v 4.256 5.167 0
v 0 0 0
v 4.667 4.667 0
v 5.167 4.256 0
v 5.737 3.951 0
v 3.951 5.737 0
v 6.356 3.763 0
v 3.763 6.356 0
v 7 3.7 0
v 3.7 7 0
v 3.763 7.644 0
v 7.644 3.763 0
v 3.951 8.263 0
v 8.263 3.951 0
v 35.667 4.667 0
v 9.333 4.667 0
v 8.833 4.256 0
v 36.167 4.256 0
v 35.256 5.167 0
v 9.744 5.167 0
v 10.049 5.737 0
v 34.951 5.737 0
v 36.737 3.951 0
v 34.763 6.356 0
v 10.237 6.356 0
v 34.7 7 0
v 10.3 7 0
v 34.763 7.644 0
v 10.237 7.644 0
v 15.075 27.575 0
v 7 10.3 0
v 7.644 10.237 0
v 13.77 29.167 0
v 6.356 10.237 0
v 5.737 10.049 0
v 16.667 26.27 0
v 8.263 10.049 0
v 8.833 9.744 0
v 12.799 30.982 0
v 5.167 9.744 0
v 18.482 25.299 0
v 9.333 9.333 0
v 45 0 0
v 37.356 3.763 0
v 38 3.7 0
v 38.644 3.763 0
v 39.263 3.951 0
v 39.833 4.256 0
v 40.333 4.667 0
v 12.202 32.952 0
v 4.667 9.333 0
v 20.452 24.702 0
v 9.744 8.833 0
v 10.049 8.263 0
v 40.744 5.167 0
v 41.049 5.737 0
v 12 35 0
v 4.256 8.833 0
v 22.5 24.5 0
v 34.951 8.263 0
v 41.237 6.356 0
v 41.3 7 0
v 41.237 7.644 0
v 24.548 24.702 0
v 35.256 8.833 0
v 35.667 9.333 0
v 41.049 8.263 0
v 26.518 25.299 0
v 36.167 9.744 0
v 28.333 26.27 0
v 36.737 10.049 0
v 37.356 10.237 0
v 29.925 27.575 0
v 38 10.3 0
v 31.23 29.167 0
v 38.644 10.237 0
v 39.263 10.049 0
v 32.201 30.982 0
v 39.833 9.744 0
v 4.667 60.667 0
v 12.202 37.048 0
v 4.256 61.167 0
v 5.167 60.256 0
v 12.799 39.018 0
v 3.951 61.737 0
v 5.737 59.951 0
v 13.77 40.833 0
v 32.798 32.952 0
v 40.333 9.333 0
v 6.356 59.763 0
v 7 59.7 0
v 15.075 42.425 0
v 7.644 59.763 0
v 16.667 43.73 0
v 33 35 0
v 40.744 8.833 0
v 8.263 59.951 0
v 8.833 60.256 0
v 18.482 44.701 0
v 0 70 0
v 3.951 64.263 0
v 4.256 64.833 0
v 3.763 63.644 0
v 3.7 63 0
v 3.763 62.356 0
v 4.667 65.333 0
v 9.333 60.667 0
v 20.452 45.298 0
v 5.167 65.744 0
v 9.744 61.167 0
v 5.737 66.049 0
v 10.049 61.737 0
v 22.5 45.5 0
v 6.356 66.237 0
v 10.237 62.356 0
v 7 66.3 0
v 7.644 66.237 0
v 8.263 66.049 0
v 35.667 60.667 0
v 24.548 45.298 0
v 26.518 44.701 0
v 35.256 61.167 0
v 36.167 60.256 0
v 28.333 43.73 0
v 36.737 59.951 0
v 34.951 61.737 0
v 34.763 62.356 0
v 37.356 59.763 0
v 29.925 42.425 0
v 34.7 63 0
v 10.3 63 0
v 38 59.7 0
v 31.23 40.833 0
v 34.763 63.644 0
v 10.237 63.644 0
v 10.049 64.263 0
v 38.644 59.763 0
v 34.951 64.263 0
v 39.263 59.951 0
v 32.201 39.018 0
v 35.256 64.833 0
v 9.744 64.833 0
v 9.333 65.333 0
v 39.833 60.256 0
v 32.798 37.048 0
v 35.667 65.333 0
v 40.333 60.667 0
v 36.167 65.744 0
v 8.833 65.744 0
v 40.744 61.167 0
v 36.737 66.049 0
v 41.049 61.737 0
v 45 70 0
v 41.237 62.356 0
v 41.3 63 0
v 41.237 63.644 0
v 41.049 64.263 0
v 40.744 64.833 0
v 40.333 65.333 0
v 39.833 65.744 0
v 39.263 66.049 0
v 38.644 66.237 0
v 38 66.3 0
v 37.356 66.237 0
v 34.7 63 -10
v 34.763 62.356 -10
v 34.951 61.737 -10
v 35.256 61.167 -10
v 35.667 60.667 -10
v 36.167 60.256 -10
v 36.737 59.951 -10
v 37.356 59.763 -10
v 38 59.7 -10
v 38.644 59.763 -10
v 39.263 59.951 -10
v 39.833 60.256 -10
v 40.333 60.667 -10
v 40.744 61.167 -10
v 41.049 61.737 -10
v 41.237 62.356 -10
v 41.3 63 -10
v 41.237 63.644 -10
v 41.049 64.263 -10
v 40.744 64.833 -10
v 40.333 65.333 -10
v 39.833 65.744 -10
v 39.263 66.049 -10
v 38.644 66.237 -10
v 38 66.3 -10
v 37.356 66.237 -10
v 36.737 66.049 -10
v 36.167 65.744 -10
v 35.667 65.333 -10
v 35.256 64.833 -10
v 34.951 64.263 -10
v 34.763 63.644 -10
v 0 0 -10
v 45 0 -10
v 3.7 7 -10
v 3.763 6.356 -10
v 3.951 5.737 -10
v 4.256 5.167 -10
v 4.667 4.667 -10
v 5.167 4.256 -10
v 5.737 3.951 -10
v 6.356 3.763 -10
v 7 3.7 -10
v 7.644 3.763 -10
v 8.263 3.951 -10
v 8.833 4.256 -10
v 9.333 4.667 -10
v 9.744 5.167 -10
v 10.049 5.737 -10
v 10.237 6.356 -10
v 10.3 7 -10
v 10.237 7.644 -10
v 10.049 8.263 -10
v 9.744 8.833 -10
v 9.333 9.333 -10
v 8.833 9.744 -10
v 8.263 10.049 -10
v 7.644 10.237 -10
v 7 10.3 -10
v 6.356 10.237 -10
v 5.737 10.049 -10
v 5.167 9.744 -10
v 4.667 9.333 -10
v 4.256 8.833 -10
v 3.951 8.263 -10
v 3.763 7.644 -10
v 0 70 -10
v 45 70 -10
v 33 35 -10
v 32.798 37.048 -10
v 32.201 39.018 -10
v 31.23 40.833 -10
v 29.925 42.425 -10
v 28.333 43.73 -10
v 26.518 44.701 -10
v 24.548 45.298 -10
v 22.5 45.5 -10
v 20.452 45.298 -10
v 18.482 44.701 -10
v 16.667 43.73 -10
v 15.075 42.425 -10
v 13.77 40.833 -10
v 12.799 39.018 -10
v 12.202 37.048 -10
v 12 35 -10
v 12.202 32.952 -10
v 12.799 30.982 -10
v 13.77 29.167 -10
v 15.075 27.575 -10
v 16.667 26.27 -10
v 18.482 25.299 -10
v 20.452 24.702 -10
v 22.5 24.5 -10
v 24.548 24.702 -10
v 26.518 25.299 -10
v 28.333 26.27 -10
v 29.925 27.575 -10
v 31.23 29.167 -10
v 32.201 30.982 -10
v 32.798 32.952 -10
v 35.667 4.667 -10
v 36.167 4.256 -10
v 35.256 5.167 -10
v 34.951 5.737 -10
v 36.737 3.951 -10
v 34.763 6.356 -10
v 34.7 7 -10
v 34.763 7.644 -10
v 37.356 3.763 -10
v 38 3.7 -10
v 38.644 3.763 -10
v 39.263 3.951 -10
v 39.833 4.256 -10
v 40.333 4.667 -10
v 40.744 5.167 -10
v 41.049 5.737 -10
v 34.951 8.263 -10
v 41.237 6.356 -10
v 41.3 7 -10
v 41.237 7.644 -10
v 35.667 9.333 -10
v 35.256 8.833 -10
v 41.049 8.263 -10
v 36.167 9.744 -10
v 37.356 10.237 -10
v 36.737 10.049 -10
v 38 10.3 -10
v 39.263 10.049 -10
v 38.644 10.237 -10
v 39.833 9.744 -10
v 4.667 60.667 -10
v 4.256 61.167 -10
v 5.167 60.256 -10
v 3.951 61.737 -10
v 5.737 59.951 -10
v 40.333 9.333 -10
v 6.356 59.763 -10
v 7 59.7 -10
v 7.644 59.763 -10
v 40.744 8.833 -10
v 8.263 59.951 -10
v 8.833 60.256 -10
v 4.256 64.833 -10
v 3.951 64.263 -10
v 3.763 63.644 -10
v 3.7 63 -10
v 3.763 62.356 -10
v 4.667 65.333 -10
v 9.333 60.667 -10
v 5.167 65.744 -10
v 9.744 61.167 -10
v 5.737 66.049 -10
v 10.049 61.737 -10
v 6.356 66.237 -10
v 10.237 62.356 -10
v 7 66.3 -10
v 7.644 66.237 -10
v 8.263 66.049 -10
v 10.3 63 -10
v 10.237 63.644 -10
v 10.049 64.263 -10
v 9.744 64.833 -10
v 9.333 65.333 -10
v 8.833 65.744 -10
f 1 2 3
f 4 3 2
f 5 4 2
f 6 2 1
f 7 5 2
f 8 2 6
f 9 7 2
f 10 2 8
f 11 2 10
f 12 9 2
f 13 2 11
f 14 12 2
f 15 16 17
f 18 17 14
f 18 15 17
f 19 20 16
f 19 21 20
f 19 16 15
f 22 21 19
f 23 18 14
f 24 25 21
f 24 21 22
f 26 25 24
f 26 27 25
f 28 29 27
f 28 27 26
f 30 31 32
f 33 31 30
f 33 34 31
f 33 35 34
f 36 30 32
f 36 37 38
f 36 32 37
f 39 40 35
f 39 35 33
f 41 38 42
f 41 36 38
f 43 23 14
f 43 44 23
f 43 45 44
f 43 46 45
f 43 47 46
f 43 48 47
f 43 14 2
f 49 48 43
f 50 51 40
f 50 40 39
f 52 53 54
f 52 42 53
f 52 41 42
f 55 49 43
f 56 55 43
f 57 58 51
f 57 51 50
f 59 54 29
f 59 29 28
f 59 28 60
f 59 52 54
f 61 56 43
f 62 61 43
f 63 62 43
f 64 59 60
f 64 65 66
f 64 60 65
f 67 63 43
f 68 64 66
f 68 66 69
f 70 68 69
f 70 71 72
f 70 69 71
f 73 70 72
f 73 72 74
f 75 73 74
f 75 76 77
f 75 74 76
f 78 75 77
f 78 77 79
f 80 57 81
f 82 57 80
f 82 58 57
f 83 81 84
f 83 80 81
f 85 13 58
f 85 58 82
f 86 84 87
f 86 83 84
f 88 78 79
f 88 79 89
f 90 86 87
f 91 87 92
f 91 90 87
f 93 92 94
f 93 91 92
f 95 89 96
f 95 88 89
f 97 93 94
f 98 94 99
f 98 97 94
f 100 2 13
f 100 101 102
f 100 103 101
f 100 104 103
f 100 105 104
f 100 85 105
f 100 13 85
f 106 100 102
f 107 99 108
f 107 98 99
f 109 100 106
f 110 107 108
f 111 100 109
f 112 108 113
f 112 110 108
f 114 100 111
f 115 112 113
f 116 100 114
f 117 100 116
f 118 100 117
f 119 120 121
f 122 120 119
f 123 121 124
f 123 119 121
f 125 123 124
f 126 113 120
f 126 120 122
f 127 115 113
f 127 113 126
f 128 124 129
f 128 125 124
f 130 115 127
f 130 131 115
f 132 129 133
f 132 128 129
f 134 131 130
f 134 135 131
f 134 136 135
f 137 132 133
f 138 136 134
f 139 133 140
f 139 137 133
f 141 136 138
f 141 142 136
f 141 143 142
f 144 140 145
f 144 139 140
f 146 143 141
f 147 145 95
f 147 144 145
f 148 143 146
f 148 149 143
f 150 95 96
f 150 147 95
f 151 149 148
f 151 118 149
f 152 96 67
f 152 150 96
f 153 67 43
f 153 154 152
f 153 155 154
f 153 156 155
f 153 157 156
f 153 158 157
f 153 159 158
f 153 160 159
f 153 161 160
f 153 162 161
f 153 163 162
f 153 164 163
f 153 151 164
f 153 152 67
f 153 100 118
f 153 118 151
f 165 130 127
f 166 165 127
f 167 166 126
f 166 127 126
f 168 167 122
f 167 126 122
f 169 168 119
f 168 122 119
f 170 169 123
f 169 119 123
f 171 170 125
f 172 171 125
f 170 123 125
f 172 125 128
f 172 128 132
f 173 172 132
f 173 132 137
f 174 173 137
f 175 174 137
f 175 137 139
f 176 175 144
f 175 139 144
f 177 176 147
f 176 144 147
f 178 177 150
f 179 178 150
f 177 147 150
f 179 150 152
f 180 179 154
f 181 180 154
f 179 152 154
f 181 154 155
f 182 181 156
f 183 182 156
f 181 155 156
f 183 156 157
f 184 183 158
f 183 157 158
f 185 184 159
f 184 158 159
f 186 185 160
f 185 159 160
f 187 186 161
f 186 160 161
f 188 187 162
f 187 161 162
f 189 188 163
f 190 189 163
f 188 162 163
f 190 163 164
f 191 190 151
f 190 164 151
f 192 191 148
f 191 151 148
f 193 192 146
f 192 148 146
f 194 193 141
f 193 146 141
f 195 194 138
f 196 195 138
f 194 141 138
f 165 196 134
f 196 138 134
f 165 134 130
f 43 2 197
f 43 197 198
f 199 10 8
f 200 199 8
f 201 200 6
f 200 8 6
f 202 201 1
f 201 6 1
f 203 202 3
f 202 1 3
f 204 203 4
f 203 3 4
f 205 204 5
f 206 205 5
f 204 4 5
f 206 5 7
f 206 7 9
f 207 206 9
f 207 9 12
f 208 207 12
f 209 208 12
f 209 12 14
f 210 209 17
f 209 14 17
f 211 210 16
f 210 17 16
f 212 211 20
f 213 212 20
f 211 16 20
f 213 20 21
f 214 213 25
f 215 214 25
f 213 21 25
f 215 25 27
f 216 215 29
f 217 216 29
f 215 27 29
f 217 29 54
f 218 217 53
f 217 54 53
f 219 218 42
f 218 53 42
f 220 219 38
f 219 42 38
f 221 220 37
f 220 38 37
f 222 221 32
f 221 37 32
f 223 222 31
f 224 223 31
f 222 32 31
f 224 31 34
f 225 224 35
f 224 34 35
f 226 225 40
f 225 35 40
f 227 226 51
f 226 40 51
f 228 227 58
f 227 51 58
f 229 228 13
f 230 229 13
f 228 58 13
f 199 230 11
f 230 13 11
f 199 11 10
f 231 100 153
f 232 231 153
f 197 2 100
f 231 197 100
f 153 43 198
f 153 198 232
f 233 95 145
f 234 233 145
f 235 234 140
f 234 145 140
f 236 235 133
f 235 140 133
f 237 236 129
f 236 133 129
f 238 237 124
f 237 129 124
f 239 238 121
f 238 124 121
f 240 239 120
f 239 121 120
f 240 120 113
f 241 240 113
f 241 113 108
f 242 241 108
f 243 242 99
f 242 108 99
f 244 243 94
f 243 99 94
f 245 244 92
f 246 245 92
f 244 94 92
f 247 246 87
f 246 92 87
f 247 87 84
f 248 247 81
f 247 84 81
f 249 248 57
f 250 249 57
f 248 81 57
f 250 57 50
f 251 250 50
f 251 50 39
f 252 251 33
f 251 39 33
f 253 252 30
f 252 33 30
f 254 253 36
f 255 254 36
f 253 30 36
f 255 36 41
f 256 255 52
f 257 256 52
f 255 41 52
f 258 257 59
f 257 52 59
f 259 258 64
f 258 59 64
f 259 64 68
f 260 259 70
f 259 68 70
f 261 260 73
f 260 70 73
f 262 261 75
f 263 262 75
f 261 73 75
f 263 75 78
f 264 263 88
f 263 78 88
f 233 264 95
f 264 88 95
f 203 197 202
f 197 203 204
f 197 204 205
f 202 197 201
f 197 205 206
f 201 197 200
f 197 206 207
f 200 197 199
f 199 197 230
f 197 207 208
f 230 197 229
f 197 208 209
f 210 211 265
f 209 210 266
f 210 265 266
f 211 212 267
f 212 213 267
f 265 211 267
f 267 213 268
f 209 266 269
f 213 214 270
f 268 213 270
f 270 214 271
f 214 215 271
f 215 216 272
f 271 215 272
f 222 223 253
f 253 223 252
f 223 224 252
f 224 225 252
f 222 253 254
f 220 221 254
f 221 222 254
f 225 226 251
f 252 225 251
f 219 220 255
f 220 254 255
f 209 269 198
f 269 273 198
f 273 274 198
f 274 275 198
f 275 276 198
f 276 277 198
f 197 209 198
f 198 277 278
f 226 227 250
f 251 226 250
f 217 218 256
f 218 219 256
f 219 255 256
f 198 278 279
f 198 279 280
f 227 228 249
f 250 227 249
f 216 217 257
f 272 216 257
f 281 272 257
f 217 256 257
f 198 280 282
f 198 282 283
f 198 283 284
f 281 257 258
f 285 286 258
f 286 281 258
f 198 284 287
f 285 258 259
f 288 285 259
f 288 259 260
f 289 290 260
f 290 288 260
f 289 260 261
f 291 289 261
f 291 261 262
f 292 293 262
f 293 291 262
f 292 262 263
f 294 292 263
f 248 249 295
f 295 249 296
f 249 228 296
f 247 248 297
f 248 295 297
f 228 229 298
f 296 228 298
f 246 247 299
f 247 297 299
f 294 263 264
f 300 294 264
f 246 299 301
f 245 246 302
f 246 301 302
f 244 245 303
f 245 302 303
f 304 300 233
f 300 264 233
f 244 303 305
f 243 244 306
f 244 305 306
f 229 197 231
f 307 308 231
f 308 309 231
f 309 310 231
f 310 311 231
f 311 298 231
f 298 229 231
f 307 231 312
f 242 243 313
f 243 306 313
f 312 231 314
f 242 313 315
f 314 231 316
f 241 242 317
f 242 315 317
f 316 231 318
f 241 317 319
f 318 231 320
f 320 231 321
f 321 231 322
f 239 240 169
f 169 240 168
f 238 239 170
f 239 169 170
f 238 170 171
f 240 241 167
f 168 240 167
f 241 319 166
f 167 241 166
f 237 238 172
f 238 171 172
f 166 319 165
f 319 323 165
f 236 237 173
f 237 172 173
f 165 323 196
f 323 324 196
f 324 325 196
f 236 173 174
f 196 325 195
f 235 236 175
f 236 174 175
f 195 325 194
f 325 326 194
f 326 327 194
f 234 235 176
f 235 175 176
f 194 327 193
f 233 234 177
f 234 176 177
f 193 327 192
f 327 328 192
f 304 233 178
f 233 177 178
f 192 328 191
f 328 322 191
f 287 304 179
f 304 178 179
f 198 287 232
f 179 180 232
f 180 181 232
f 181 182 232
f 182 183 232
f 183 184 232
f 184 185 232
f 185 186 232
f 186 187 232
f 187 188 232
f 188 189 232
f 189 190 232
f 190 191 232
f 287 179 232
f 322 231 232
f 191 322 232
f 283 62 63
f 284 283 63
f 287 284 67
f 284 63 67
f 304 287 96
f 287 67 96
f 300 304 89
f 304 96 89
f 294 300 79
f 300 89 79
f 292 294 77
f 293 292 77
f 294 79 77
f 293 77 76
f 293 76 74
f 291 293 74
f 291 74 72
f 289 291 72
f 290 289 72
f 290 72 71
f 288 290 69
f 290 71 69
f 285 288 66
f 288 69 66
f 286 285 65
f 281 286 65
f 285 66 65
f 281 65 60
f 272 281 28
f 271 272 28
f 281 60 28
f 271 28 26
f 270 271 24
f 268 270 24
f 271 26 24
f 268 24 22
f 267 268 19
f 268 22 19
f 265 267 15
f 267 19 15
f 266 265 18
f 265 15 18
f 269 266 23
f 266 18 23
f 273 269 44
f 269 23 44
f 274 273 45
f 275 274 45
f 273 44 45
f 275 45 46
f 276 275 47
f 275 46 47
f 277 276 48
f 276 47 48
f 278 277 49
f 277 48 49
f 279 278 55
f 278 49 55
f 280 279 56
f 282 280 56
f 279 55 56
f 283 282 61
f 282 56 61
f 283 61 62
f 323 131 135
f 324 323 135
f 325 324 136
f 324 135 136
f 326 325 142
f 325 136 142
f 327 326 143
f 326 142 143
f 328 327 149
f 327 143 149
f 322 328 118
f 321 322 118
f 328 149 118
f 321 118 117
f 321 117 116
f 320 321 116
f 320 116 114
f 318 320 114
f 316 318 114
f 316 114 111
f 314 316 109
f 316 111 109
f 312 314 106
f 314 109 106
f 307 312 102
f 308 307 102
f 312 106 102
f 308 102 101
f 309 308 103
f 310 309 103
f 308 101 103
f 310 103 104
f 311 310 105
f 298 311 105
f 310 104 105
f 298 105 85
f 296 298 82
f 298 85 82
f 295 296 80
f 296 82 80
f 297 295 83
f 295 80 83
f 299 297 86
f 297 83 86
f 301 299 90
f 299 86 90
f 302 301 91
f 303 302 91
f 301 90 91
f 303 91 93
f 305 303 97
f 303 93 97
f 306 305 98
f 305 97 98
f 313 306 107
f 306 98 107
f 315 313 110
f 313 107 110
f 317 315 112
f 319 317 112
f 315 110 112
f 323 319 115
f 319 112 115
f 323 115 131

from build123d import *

# Parameters (mm, degrees)
SCHIZZO1_W                   = 45
SCHIZZO1_H                   = 70
ESTRUSIONE_ESTRUSIONE1_DEPTH = 10
SCHIZZO2_R                   = 10.5
SCHIZZO2_R_2                 = 3.3
TAGLIO_ESTRUSIONE1_DEPTH     = 10


with BuildPart() as part:
    # Schizzo1 → Estrusione-Estrusione1 (new body)
    with BuildSketch(Plane.XY):
        with Locations((22.5, 35)):
            Rectangle(SCHIZZO1_W, SCHIZZO1_H)
    extrude(amount=-ESTRUSIONE_ESTRUSIONE1_DEPTH)

    # Schizzo2 → Taglio-Estrusione1 (cut)
    with BuildSketch(Plane.XY):
        with Locations((22.5, 35)):
            Circle(SCHIZZO2_R)
        with Locations((38, 7)):
            Circle(SCHIZZO2_R_2)
        with Locations(Location((38, 63, 0), (0, 0, 180))):
            Circle(SCHIZZO2_R_2)
        with Locations(Location((7, 7, 0), (0, 0, 180))):
            Circle(SCHIZZO2_R_2)
        with Locations((7, 63)):
            Circle(SCHIZZO2_R_2)
    extrude(amount=-TAGLIO_ESTRUSIONE1_DEPTH, mode=Mode.SUBTRACT)


solid = part.part
